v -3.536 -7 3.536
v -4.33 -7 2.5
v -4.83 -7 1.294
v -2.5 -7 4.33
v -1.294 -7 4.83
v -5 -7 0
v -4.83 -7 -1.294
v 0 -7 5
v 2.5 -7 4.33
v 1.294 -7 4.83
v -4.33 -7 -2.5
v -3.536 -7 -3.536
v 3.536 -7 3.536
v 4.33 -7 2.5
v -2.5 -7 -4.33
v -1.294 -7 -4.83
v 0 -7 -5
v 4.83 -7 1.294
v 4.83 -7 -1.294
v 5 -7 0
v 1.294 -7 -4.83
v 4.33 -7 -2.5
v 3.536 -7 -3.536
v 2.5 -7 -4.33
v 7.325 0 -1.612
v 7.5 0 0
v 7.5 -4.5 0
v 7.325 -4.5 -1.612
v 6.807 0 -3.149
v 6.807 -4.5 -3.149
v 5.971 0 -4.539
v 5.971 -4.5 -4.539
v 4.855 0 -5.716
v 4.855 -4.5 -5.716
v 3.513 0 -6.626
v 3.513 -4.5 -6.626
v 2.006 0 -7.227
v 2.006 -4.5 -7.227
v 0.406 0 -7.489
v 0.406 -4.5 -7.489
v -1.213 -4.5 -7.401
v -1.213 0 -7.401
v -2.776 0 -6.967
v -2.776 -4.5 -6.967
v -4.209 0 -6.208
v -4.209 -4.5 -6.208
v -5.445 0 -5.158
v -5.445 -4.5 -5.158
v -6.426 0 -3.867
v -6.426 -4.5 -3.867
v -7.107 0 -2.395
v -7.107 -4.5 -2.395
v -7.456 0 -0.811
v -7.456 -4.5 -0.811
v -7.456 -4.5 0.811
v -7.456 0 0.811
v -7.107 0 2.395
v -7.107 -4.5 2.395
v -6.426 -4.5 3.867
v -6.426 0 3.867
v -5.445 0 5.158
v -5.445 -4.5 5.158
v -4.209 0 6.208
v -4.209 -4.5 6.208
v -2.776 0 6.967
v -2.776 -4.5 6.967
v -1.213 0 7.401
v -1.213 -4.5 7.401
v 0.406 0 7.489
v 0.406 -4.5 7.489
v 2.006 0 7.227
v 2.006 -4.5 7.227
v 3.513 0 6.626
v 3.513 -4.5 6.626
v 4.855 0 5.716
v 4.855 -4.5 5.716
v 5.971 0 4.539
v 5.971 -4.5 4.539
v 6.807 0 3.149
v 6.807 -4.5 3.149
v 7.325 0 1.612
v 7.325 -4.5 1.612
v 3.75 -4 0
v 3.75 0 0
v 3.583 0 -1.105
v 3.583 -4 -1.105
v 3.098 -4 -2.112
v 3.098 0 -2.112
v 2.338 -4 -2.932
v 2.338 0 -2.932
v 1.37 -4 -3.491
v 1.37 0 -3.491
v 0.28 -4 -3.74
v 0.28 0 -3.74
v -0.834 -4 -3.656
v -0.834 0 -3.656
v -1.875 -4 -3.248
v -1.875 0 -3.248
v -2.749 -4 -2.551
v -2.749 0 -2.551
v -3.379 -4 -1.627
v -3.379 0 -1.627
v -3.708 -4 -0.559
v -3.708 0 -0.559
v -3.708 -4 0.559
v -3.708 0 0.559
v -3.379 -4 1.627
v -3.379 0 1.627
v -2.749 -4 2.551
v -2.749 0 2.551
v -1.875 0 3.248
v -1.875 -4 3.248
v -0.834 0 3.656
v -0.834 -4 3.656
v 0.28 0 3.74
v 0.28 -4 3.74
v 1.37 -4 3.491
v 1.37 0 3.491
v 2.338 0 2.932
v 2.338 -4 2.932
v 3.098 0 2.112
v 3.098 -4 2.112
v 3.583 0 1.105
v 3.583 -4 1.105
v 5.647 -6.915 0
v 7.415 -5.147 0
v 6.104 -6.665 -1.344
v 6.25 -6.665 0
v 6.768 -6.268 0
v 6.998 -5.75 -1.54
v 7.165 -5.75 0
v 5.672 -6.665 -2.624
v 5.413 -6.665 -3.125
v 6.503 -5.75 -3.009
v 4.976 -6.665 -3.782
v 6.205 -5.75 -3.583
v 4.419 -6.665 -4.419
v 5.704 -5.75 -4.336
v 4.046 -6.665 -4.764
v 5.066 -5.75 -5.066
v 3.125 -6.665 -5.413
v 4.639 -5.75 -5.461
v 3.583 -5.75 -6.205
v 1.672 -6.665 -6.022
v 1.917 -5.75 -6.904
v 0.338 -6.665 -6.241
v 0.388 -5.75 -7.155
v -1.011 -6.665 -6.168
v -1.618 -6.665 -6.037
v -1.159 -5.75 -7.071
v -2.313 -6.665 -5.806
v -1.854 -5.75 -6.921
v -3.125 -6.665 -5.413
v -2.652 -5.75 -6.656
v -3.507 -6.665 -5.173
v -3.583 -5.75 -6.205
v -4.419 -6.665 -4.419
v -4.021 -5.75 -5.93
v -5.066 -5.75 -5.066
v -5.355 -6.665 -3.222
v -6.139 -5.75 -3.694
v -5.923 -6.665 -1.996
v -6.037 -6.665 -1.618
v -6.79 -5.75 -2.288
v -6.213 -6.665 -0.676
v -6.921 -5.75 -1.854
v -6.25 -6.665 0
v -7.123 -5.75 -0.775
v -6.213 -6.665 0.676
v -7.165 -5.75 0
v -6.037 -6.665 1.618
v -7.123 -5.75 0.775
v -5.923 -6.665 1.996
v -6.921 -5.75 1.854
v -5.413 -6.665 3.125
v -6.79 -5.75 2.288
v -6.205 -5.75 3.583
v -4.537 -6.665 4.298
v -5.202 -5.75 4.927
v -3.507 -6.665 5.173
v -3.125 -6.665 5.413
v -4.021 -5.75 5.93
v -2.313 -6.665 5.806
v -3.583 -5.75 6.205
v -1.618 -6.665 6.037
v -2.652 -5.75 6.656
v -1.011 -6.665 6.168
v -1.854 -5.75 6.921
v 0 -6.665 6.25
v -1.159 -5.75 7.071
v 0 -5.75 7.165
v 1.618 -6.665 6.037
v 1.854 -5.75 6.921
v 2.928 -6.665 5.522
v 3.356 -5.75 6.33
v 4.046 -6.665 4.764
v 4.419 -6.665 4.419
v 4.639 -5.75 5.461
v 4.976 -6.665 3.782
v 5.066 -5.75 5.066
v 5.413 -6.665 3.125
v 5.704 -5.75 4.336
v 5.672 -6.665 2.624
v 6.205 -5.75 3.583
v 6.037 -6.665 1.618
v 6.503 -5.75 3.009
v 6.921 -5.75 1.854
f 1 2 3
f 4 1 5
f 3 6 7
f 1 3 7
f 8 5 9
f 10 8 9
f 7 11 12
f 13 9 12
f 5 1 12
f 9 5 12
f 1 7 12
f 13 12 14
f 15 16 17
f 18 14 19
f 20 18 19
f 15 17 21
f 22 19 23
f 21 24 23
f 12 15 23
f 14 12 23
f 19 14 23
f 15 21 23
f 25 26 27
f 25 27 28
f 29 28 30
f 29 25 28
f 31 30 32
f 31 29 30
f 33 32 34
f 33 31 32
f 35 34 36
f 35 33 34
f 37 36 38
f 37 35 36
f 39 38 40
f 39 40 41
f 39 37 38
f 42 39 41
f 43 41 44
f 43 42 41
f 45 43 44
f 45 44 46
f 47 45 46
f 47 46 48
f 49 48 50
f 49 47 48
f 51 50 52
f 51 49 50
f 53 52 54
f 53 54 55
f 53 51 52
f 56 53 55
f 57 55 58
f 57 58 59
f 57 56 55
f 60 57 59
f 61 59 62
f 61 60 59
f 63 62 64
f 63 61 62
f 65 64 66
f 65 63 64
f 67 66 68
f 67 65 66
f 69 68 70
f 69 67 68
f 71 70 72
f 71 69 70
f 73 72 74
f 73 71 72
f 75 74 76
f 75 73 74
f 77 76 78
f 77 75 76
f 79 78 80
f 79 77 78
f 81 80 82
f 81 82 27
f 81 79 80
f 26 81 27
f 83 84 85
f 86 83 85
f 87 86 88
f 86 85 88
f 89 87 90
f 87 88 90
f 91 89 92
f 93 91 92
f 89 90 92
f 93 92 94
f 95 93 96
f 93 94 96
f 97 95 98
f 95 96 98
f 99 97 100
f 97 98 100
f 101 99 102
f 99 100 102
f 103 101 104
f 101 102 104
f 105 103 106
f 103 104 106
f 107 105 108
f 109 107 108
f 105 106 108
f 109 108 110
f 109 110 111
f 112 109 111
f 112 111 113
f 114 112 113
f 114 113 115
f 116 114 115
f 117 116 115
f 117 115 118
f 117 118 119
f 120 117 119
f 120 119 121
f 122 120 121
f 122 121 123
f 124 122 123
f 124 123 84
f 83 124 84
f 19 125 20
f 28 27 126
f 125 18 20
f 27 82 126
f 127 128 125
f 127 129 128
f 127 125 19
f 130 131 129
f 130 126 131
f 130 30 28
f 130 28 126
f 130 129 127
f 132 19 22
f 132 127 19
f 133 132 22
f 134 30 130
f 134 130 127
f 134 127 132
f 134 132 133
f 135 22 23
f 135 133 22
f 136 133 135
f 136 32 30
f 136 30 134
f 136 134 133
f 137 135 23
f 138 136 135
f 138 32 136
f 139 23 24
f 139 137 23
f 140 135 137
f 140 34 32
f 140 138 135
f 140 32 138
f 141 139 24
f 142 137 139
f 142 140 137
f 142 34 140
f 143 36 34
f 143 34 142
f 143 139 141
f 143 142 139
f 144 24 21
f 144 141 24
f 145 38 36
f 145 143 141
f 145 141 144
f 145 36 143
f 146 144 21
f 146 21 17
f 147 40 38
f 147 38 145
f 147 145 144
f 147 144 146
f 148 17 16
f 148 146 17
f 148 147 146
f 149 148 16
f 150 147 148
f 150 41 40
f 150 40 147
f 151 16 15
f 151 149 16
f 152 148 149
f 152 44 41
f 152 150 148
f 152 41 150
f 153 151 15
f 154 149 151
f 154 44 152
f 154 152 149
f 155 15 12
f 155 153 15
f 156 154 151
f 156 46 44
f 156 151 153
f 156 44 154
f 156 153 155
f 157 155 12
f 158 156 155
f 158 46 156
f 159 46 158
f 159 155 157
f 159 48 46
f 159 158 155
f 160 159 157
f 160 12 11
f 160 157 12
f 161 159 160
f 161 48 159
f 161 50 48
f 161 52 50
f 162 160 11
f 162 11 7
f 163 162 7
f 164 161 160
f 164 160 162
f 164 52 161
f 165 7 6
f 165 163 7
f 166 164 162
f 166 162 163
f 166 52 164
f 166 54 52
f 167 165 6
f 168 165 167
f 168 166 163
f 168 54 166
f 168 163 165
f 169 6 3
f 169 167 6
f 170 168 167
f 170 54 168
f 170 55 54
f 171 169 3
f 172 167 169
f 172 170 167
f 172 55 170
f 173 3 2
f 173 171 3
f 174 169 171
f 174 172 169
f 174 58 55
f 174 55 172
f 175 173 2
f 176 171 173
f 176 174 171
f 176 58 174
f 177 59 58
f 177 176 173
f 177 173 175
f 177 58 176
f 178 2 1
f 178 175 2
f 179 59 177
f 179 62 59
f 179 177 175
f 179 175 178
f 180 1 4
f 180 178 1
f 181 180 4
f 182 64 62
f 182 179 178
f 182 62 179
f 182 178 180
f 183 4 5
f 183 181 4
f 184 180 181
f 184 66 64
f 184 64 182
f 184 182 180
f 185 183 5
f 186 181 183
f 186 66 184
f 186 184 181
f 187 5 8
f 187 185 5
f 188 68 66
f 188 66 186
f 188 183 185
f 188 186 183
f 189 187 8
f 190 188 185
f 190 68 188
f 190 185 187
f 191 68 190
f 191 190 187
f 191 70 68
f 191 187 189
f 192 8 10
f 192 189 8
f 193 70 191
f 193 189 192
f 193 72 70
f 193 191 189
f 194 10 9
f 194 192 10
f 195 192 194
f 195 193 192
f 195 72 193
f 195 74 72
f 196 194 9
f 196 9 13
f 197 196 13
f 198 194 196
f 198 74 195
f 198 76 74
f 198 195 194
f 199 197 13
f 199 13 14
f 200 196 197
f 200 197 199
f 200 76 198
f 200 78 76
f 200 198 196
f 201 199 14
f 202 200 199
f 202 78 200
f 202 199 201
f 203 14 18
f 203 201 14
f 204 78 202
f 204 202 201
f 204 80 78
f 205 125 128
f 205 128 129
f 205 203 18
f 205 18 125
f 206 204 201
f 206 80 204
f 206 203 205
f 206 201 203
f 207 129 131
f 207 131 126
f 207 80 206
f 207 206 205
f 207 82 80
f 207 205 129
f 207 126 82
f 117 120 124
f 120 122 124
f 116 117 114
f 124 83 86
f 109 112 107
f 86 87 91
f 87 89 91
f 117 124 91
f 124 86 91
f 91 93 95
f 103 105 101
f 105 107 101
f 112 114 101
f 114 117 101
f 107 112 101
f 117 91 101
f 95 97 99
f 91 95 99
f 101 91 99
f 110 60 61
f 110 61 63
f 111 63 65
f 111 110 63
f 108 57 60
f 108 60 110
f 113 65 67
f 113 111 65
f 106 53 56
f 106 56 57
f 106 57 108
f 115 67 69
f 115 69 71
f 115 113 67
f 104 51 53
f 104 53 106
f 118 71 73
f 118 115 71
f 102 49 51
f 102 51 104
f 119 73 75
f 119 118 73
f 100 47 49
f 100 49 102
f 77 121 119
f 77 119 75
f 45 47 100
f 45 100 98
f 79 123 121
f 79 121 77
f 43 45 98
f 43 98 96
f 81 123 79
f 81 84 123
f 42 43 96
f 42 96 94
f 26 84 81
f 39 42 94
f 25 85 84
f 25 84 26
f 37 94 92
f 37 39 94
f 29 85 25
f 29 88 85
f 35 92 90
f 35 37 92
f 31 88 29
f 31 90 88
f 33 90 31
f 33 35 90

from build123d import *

# Parameters (mm, degrees)
SKETCH_1_R      = 7.5
SKETCH_1_R_2    = 3.75
EXTRUDE_1_DEPTH = 7
SKETCH_2_R      = 6
EXTRUDE_2_DEPTH = 3
FILLET_1_R      = 2.5


with BuildPart() as part:
    # Эскиз1 → Бобышка-Вытянуть1 (new body)
    with BuildSketch(Plane(origin=(0, 0, 0), x_dir=(1, 0, 0), z_dir=(0, 1, 0))):
        Circle(SKETCH_1_R)
        Circle(SKETCH_1_R_2, mode=Mode.SUBTRACT)
    extrude(amount=-EXTRUDE_1_DEPTH)

    # Эскиз2 → Бобышка-Вытянуть2 (add)
    with BuildSketch(Plane(origin=(0, -7, 0), x_dir=(-1, 0, 0), z_dir=(0, -1, 0))):
        Circle(SKETCH_2_R)
    extrude(amount=-EXTRUDE_2_DEPTH)

    # Скругление1
    fillet_1_edges = [part.edges().sort_by_distance(p)[0] for p in [
        (-7.5, -7, 0),
    ]]
    fillet(fillet_1_edges, radius=FILLET_1_R)


solid = part.part
